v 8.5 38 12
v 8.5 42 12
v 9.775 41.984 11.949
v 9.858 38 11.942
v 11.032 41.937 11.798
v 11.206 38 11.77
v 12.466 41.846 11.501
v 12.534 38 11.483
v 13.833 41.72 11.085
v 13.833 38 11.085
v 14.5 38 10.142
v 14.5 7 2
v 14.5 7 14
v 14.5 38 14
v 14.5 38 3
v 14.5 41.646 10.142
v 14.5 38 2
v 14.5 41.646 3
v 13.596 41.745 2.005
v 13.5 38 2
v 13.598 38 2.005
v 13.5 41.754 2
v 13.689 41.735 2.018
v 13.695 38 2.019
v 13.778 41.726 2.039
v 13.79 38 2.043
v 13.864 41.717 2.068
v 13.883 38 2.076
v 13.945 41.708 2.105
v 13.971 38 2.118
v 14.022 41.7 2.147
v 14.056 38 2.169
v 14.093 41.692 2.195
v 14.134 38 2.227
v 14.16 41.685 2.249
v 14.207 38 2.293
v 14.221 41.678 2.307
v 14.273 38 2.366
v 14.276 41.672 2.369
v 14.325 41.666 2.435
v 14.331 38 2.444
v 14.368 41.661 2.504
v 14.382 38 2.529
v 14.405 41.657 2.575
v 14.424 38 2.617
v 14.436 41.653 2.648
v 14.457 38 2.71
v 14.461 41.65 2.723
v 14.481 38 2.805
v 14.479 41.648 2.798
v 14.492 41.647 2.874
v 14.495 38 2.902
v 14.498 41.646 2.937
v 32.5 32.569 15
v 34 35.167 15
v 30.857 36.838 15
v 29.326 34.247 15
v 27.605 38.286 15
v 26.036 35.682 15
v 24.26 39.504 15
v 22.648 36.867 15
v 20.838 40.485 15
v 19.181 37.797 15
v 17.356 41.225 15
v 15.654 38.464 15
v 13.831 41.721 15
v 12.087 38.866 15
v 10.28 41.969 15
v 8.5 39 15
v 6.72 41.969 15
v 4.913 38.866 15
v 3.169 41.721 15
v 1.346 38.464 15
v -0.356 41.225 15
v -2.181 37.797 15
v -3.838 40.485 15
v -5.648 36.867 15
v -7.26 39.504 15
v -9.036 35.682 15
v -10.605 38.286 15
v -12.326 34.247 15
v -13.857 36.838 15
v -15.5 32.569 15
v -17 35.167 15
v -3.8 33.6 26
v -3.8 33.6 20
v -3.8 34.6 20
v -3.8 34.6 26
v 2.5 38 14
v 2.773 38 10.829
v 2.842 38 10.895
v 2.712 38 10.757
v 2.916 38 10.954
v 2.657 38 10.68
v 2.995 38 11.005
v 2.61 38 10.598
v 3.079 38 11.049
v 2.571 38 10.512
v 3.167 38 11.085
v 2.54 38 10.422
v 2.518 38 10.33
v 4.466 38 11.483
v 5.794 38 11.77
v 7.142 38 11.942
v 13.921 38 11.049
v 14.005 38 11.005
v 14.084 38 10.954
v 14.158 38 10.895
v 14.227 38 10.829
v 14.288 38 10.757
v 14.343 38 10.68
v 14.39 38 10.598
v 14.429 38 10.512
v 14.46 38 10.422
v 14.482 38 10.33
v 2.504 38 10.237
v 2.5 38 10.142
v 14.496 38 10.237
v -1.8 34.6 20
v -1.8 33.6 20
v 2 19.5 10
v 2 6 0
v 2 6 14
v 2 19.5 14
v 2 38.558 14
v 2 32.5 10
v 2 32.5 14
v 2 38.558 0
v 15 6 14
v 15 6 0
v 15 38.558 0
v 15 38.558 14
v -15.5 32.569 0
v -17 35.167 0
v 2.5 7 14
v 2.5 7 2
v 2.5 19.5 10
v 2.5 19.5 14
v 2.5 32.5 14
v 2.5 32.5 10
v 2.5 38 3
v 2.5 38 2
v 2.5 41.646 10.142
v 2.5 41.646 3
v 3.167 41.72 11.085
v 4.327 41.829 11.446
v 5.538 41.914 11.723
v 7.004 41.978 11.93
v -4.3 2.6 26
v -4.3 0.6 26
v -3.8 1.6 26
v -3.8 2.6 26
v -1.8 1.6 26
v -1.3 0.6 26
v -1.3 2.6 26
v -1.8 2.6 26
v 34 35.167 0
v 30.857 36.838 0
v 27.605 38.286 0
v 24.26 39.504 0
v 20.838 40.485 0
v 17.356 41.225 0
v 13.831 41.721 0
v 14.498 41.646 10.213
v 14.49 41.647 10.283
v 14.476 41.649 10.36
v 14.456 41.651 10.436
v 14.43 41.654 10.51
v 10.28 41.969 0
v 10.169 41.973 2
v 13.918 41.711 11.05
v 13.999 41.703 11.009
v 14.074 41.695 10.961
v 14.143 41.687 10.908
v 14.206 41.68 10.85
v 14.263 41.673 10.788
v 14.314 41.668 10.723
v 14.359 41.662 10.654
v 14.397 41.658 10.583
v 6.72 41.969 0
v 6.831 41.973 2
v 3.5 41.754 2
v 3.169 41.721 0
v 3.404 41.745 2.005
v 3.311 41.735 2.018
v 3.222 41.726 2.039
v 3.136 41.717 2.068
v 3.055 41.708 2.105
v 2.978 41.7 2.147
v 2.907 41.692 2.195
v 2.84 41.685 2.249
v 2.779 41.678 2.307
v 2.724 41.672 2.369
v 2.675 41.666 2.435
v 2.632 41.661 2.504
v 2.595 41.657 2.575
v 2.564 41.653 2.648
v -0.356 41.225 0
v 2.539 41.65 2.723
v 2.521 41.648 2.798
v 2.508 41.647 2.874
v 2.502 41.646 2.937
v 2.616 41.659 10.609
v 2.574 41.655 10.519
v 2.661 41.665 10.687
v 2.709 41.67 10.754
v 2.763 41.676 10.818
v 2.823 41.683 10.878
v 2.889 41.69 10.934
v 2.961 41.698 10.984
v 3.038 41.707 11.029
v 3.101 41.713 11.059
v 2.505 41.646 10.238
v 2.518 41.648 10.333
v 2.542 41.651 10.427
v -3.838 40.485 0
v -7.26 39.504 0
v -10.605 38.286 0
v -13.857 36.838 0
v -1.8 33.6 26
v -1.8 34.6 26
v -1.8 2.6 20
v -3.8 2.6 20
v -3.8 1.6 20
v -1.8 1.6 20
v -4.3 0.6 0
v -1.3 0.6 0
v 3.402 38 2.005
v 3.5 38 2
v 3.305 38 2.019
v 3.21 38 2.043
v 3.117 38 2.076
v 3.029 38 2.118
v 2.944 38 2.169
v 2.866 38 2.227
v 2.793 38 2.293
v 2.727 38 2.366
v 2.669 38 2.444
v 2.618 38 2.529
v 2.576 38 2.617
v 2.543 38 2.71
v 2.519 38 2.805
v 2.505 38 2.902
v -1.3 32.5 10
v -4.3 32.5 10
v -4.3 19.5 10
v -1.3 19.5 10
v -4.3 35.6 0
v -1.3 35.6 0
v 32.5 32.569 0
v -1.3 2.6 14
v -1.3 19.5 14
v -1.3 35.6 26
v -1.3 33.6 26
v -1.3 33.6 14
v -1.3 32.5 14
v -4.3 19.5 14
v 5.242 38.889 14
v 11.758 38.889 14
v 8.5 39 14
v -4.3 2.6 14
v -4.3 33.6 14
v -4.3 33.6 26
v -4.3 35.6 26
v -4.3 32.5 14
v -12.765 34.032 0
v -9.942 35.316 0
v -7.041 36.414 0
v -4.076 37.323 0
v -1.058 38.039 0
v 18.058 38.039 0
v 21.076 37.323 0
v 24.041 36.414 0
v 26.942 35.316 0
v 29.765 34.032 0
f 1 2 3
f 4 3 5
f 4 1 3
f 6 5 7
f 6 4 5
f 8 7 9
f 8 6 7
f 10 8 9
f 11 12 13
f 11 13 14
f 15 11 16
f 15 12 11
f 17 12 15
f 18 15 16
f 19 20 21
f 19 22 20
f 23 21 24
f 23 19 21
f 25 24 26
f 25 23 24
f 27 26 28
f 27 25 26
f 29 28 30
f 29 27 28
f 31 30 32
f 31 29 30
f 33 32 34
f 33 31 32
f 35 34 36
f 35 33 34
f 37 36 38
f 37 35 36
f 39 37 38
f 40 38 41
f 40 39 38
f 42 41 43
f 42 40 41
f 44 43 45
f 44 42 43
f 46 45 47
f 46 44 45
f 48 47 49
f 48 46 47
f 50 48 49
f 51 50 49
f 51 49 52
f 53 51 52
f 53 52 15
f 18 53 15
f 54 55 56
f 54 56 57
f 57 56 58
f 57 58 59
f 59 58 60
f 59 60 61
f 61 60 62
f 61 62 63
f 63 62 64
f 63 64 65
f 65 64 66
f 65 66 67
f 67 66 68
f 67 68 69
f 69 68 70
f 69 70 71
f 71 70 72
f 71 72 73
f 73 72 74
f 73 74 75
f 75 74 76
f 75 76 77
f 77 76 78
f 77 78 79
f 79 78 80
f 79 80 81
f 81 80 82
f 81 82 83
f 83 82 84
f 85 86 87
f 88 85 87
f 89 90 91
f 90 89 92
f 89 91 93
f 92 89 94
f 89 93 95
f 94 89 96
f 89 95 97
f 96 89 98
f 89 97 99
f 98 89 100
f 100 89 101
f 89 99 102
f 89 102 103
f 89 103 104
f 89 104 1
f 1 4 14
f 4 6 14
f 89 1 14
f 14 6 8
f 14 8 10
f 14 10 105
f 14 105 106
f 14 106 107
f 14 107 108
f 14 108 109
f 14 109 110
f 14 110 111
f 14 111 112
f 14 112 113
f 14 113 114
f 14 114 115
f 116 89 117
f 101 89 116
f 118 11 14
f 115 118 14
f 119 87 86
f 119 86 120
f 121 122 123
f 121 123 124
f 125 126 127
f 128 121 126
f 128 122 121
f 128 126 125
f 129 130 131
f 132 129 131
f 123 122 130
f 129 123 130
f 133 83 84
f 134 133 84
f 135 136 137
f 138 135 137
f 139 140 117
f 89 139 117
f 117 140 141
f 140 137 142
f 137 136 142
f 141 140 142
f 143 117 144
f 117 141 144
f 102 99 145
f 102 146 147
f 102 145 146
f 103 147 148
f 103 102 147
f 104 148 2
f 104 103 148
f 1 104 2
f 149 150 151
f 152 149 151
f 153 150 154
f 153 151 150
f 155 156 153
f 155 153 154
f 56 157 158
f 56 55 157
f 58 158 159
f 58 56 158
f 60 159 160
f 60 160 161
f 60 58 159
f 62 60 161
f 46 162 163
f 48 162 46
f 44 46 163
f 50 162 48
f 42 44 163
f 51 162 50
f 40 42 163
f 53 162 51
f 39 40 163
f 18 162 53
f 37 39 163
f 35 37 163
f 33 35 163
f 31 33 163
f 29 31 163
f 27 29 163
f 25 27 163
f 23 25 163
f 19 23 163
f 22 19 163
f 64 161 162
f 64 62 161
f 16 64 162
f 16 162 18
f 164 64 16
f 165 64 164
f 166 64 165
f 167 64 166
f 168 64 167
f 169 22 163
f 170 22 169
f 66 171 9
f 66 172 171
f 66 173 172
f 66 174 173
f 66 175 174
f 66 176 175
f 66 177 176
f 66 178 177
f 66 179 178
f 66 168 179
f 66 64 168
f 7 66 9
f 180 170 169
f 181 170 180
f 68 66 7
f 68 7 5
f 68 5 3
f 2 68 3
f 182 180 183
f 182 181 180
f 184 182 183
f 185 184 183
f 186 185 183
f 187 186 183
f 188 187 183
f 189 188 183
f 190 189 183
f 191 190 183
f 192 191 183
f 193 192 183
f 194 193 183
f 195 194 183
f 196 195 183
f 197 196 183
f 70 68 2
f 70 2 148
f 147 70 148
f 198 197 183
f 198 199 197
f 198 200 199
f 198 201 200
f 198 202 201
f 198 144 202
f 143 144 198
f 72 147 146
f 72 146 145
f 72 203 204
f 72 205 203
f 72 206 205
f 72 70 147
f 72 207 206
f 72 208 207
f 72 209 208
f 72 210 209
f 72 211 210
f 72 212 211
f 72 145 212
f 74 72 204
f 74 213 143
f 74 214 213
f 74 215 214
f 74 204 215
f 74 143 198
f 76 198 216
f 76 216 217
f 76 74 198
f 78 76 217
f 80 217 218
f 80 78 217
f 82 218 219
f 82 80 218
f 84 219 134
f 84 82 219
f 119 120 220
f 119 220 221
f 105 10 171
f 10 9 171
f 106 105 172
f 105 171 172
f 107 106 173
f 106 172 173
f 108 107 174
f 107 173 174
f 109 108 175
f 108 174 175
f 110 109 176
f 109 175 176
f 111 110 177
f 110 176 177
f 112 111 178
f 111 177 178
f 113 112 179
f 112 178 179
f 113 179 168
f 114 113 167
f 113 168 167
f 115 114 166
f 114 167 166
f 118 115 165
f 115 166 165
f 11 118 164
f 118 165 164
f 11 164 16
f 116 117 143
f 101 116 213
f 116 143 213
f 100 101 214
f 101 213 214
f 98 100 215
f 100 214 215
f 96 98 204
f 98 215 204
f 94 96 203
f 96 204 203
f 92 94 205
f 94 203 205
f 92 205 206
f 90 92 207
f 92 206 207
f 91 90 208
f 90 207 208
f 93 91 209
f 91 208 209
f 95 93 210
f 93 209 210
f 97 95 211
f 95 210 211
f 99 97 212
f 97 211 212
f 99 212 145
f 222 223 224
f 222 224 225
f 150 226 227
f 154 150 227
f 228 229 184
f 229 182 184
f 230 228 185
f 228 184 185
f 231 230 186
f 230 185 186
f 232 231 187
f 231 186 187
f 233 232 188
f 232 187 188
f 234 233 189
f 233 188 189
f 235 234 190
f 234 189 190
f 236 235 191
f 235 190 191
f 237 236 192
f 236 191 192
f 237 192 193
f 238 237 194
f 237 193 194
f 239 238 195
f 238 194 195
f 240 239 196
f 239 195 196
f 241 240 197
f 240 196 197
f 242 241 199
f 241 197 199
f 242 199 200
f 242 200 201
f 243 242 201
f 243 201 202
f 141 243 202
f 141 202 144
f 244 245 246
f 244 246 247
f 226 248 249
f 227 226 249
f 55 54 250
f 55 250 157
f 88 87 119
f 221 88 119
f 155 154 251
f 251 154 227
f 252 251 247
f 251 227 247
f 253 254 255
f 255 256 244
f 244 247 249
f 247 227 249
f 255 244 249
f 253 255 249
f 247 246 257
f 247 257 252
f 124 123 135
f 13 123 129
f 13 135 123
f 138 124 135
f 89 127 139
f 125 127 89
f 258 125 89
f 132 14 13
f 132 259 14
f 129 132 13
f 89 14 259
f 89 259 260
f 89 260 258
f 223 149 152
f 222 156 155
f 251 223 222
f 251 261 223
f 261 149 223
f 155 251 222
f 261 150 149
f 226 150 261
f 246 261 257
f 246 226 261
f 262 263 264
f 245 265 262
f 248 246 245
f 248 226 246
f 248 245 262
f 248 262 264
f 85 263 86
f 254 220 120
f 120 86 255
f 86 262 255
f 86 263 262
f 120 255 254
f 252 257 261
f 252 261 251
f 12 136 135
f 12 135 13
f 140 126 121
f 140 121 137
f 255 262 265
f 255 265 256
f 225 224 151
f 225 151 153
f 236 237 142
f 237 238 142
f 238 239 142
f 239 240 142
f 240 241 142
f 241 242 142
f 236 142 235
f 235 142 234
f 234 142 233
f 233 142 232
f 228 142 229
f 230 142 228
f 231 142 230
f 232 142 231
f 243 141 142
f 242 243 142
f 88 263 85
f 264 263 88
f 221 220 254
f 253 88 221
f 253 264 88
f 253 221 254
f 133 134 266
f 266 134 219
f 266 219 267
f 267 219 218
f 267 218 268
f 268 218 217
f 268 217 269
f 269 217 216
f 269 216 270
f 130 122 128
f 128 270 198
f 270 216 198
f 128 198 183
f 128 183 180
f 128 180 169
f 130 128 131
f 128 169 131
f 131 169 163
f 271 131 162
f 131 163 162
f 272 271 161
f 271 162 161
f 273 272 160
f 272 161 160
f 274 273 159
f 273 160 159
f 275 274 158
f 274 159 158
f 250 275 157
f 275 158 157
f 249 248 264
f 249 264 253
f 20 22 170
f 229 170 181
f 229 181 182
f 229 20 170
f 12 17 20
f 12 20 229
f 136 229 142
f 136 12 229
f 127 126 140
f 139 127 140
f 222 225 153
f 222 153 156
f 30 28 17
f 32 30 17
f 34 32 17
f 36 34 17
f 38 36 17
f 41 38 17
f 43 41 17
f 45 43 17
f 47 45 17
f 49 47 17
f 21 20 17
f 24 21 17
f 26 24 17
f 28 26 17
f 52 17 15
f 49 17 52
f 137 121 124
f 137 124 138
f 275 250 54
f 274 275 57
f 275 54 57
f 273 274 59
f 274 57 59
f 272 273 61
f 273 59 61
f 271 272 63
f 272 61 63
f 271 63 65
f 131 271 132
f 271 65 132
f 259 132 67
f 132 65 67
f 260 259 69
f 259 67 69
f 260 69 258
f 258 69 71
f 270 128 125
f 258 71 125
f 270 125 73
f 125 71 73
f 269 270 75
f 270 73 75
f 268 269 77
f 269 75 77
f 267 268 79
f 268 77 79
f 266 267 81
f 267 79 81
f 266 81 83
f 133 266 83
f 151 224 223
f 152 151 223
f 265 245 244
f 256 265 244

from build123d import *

# Parameters (mm, degrees)
BOX005_W                    = 10
BOX005_H                    = 13
BOX005_DEPTH                = 4
BOX004_W                    = 3
BOX004_H                    = 31
BOX004_DEPTH                = 14
BOX003_W                    = 2
BOX003_H                    = 33
BOX003_DEPTH                = 11.2
BOX002_W                    = 3
BOX002_H                    = 35
BOX002_DEPTH                = 26
EXTRUDE_DEPTH               = 5
EXTRUDE001_DEPTH            = 5
THICKNESS_T                 = 1
BOX_W                       = 12
BOX_H                       = 31
BOX_DEPTH                   = 15
BOX001_W                    = 13
BOX001_H                    = 34
BOX001_DEPTH                = 14
CYLINDER001_W               = 48
CYLINDER001_H               = 15
CYLINDER001_ANGLE           = 60
CYLINDER001_PLACEMENT_ANGLE = 60
CYLINDER_W                  = 51
CYLINDER_H                  = 15
CYLINDER_ANGLE              = 60
CYLINDER_PLACEMENT_ANGLE    = 60


with BuildPart() as servo_wall_cutaway:
    # Box005 → Box005 (new body)
    with BuildSketch(Plane(origin=(-6, 19.5, 10), x_dir=(1, 0, 0), z_dir=(0, 0, 1))):
        with Locations((5, 6.5)):
            Rectangle(BOX005_W, BOX005_H)
    extrude(amount=BOX005_DEPTH)


with BuildPart() as slot_wall_cutout2:
    # Box004 → Box004 (new body)
    with BuildSketch(Plane(origin=(-1, 7, 14), x_dir=(1, 0, 0), z_dir=(0, 0, 1))):
        with Locations((1.5, 15.5)):
            Rectangle(BOX004_W, BOX004_H)
    extrude(amount=BOX004_DEPTH)


with BuildPart() as slot_wall_cutout1:
    # Box003 → Box003 (new body)
    with BuildSketch(Plane(origin=(-0.5, 6, 20), x_dir=(1, 0, 0), z_dir=(0, 0, 1))):
        with Locations((1, 16.5)):
            Rectangle(BOX003_W, BOX003_H)
    extrude(amount=BOX003_DEPTH)


with BuildPart() as wall_slot_finished:
    # Box002 → Box002 (new body)
    with BuildSketch(Plane(origin=(-1, 5, 0), x_dir=(1, 0, 0), z_dir=(0, 0, 1))):
        with Locations((1.5, 17.5)):
            Rectangle(BOX002_W, BOX002_H)
    extrude(amount=BOX002_DEPTH)

    # Cut003: cut slot wall cutout1
    add(slot_wall_cutout1.part, mode=Mode.SUBTRACT)

    # Cut004: cut slot wall cutout2
    add(slot_wall_cutout2.part, mode=Mode.SUBTRACT)


with BuildPart() as wall_slot_finished_1:
    # Cut004 placement: moved
    add(wall_slot_finished.part.moved(Location((-3.3, -4.4, 0))))


with BuildPart() as extrude_body:
    # Common_cs → Extrude (new body)
    with BuildSketch(Plane(origin=(8.5, 45, 6), x_dir=(1, 0, 0), z_dir=(0, 1, 0))):
        with BuildLine():
            Line((5, 4), (-5, 4))
            Line((-5, 4), (-5, -3.142136))
            ThreePointArc((-5, -3.142136), (-2.53653, -3.783978), (0, -4))
            ThreePointArc((0, -4), (2.53653, -3.783978), (5, -3.142136))
            Line((5, -3.142136), (5, 4))
        make_face()
    extrude(amount=EXTRUDE_DEPTH)


with BuildPart() as extrude001:
    # Common_cs001 → Extrude001 (new body)
    with BuildSketch(Plane(origin=(8.5, 45, 6), x_dir=(1, 0, 0), z_dir=(0, 1, 0))):
        with BuildLine():
            Line((5, 4), (-5, 4))
            Line((-5, 4), (-5, -3.142136))
            ThreePointArc((-5, -3.142136), (-2.53653, -3.783978), (0, -4))
            ThreePointArc((0, -4), (2.53653, -3.783978), (5, -3.142136))
            Line((5, -3.142136), (5, 4))
        make_face()
    extrude(amount=EXTRUDE001_DEPTH)


with BuildPart() as bolt_bottle_side_opening:
    # Thickness base: copy of Extrude body
    add(extrude_body.part)

    # Thickness
    thickness_openings = [bolt_bottle_side_opening.faces().sort_by_distance(p)[0] for p in [
        (8.5, 50, 5.862901),
    ]]
    offset(amount=THICKNESS_T, openings=thickness_openings)

    # Fusion: union Extrude body, Extrude001
    add(extrude_body.part)
    add(extrude001.part)


with BuildPart() as bolt_bottle_side_opening_1:
    # Fusion placement: moved
    add(bolt_bottle_side_opening.part.moved(Location((0, -7, 1))))


with BuildPart() as pullbay:
    # Box → Box (new body)
    with BuildSketch(Plane(origin=(2.5, 7, 2), x_dir=(1, 0, 0), z_dir=(0, 0, 1))):
        with Locations((6, 15.5)):
            Rectangle(BOX_W, BOX_H)
    extrude(amount=BOX_DEPTH)


with BuildPart() as cut_bay_from_case:
    # Box001 → Box001 (new body)
    with BuildSketch(Plane(origin=(2, 6, 0), x_dir=(1, 0, 0), z_dir=(0, 0, 1))):
        with Locations((6.5, 17)):
            Rectangle(BOX001_W, BOX001_H)
    extrude(amount=BOX001_DEPTH)

    # Cut001: cut pullBay
    add(pullbay.part, mode=Mode.SUBTRACT)


with BuildPart() as bottle_wall001:
    # Cylinder001 → Cylinder001 (revolve)
    with BuildSketch(Plane.XZ):
        with Locations((24, 7.5)):
            Rectangle(CYLINDER001_W, CYLINDER001_H)
    revolve(axis=Axis((0, 0, 0), (0, 0, 1)), revolution_arc=CYLINDER001_ANGLE)


with BuildPart() as bottle_wall001_1:
    # Cylinder001 placement: moved
    add(bottle_wall001.part.moved(Location((8.5, -7, 0))).rotate(Axis((8.5, -7, 0), (0, 0, 1)), CYLINDER001_PLACEMENT_ANGLE))


with BuildPart() as cut005:
    # Cylinder → Cylinder (revolve)
    with BuildSketch(Plane.XZ):
        with Locations((25.5, 7.5)):
            Rectangle(CYLINDER_W, CYLINDER_H)
    revolve(axis=Axis((0, 0, 0), (0, 0, 1)), revolution_arc=CYLINDER_ANGLE)


with BuildPart() as cut005_1:
    # Cylinder placement: moved
    add(cut005.part.moved(Location((8.5, -7, 0))).rotate(Axis((8.5, -7, 0), (0, 0, 1)), CYLINDER_PLACEMENT_ANGLE))

    # Cut: cut bottle_wall001
    add(bottle_wall001_1.part, mode=Mode.SUBTRACT)


with BuildPart() as cut005_2:
    # Cut placement: moved
    add(cut005_1.part.moved(Location((0, -2, 0))))

    # Fusion001: union cut bay from case
    add(cut_bay_from_case.part)

    # Cut002: cut bolt_bottle_side_opening
    add(bolt_bottle_side_opening_1.part, mode=Mode.SUBTRACT)

    # Fusion002: union wall slot finished
    add(wall_slot_finished_1.part)

    # Cut005: cut servo wall cutaway
    add(servo_wall_cutaway.part, mode=Mode.SUBTRACT)


solid = cut005_2.part
